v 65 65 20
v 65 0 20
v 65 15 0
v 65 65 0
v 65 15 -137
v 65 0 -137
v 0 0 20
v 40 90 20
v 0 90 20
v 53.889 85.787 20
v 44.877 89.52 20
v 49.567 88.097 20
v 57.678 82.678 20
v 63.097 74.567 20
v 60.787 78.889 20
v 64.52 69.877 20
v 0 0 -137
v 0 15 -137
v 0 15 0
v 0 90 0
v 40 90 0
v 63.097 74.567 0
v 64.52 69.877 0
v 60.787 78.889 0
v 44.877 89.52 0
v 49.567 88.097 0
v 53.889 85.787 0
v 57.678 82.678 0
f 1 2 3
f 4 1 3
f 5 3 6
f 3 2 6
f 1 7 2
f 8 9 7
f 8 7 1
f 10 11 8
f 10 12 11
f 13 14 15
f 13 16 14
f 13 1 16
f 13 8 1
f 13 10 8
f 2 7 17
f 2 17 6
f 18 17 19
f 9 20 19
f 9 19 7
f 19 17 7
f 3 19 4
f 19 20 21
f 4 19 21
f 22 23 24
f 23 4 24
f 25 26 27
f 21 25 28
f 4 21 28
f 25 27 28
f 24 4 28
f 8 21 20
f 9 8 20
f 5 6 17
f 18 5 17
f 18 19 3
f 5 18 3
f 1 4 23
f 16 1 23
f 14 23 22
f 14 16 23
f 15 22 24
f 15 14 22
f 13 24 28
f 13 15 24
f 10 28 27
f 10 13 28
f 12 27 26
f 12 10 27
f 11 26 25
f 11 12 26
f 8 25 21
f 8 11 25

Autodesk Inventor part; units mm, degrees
ref_plane "YZ Plane" through (0, 0, 0) normal (1, 0, 0) x (0, 1, 0)
ref_plane "XZ Plane" through (0, 0, 0) normal (0, 1, 0) x (-1, 0, 0)
ref_plane "XY Plane" through (0, 0, 0) normal (0, 0, 1) x (1, 0, 0)
sketch "Sketch1" plane through (0, 0, 0) normal (0, 0, 1) x (1, 0, 0)
  line L0 (0, 0) -> (65, 0)
  line L1 (65, 0) -> (65, 90)
  line L2 (65, 90) -> (0, 90)
  line L3 (0, 90) -> (0, 0)
  dimension "d0" = 65
  dimension "d1" = 90
extrude "Extrusion1" add sketch "Sketch1" along normal blind 20
fillet "Fillet1" radius 25 1 edges at (65, 90, 10)
sketch "Sketch2" plane through (0, 0, 0) normal (0, 0, -1) x (-1, 0, 0)
  point P0 (0, 0)
sketch "Sketch3" plane through (65, 0, 20) normal (1, 0, 0) x (0, 0, -1)
  point P0 (20, 0)
sketch "Sketch4" plane through (0, 0, 0) normal (0, 0, -1) x (-1, 0, 0)
  point P0 (0, 0)
sketch "Sketch5" plane through (0, 0, 0) normal (0, -1, 0) x (1, 0, 0)
  line L0 (40, 0) -> (0, 0) projected
  line L1 (0, 0) -> (65, 0)
  line L2 (65, 0) -> (65, -137)
  line L3 (65, -137) -> (0, -137)
  line L4 (0, -137) -> (0, 0)
  dimension "d5" = 65
  dimension "d6" = 137
extrude "Extrusion2" add sketch "Sketch5" against normal blind 15
sketch "Sketch6" plane through (65, 0, -137) normal (0, 0, -1) x (-1, 0, 0)
  line L0 (65, 0) -> (0, 0) projected
  line L1 (65, 0) -> (78, 0)
  line L2 (78, 0) -> (78, 17)
  line L3 (78, 17) -> (65, 0)
  dimension "d9" = 13
  dimension "d10" = 17
sketch "Sketch7" plane through (65, 0, -137) normal (0, 0, -1) x (-1, 0, 0)
  point P0 (65, 0)
properties part number "YETTOCOMPLETE"
